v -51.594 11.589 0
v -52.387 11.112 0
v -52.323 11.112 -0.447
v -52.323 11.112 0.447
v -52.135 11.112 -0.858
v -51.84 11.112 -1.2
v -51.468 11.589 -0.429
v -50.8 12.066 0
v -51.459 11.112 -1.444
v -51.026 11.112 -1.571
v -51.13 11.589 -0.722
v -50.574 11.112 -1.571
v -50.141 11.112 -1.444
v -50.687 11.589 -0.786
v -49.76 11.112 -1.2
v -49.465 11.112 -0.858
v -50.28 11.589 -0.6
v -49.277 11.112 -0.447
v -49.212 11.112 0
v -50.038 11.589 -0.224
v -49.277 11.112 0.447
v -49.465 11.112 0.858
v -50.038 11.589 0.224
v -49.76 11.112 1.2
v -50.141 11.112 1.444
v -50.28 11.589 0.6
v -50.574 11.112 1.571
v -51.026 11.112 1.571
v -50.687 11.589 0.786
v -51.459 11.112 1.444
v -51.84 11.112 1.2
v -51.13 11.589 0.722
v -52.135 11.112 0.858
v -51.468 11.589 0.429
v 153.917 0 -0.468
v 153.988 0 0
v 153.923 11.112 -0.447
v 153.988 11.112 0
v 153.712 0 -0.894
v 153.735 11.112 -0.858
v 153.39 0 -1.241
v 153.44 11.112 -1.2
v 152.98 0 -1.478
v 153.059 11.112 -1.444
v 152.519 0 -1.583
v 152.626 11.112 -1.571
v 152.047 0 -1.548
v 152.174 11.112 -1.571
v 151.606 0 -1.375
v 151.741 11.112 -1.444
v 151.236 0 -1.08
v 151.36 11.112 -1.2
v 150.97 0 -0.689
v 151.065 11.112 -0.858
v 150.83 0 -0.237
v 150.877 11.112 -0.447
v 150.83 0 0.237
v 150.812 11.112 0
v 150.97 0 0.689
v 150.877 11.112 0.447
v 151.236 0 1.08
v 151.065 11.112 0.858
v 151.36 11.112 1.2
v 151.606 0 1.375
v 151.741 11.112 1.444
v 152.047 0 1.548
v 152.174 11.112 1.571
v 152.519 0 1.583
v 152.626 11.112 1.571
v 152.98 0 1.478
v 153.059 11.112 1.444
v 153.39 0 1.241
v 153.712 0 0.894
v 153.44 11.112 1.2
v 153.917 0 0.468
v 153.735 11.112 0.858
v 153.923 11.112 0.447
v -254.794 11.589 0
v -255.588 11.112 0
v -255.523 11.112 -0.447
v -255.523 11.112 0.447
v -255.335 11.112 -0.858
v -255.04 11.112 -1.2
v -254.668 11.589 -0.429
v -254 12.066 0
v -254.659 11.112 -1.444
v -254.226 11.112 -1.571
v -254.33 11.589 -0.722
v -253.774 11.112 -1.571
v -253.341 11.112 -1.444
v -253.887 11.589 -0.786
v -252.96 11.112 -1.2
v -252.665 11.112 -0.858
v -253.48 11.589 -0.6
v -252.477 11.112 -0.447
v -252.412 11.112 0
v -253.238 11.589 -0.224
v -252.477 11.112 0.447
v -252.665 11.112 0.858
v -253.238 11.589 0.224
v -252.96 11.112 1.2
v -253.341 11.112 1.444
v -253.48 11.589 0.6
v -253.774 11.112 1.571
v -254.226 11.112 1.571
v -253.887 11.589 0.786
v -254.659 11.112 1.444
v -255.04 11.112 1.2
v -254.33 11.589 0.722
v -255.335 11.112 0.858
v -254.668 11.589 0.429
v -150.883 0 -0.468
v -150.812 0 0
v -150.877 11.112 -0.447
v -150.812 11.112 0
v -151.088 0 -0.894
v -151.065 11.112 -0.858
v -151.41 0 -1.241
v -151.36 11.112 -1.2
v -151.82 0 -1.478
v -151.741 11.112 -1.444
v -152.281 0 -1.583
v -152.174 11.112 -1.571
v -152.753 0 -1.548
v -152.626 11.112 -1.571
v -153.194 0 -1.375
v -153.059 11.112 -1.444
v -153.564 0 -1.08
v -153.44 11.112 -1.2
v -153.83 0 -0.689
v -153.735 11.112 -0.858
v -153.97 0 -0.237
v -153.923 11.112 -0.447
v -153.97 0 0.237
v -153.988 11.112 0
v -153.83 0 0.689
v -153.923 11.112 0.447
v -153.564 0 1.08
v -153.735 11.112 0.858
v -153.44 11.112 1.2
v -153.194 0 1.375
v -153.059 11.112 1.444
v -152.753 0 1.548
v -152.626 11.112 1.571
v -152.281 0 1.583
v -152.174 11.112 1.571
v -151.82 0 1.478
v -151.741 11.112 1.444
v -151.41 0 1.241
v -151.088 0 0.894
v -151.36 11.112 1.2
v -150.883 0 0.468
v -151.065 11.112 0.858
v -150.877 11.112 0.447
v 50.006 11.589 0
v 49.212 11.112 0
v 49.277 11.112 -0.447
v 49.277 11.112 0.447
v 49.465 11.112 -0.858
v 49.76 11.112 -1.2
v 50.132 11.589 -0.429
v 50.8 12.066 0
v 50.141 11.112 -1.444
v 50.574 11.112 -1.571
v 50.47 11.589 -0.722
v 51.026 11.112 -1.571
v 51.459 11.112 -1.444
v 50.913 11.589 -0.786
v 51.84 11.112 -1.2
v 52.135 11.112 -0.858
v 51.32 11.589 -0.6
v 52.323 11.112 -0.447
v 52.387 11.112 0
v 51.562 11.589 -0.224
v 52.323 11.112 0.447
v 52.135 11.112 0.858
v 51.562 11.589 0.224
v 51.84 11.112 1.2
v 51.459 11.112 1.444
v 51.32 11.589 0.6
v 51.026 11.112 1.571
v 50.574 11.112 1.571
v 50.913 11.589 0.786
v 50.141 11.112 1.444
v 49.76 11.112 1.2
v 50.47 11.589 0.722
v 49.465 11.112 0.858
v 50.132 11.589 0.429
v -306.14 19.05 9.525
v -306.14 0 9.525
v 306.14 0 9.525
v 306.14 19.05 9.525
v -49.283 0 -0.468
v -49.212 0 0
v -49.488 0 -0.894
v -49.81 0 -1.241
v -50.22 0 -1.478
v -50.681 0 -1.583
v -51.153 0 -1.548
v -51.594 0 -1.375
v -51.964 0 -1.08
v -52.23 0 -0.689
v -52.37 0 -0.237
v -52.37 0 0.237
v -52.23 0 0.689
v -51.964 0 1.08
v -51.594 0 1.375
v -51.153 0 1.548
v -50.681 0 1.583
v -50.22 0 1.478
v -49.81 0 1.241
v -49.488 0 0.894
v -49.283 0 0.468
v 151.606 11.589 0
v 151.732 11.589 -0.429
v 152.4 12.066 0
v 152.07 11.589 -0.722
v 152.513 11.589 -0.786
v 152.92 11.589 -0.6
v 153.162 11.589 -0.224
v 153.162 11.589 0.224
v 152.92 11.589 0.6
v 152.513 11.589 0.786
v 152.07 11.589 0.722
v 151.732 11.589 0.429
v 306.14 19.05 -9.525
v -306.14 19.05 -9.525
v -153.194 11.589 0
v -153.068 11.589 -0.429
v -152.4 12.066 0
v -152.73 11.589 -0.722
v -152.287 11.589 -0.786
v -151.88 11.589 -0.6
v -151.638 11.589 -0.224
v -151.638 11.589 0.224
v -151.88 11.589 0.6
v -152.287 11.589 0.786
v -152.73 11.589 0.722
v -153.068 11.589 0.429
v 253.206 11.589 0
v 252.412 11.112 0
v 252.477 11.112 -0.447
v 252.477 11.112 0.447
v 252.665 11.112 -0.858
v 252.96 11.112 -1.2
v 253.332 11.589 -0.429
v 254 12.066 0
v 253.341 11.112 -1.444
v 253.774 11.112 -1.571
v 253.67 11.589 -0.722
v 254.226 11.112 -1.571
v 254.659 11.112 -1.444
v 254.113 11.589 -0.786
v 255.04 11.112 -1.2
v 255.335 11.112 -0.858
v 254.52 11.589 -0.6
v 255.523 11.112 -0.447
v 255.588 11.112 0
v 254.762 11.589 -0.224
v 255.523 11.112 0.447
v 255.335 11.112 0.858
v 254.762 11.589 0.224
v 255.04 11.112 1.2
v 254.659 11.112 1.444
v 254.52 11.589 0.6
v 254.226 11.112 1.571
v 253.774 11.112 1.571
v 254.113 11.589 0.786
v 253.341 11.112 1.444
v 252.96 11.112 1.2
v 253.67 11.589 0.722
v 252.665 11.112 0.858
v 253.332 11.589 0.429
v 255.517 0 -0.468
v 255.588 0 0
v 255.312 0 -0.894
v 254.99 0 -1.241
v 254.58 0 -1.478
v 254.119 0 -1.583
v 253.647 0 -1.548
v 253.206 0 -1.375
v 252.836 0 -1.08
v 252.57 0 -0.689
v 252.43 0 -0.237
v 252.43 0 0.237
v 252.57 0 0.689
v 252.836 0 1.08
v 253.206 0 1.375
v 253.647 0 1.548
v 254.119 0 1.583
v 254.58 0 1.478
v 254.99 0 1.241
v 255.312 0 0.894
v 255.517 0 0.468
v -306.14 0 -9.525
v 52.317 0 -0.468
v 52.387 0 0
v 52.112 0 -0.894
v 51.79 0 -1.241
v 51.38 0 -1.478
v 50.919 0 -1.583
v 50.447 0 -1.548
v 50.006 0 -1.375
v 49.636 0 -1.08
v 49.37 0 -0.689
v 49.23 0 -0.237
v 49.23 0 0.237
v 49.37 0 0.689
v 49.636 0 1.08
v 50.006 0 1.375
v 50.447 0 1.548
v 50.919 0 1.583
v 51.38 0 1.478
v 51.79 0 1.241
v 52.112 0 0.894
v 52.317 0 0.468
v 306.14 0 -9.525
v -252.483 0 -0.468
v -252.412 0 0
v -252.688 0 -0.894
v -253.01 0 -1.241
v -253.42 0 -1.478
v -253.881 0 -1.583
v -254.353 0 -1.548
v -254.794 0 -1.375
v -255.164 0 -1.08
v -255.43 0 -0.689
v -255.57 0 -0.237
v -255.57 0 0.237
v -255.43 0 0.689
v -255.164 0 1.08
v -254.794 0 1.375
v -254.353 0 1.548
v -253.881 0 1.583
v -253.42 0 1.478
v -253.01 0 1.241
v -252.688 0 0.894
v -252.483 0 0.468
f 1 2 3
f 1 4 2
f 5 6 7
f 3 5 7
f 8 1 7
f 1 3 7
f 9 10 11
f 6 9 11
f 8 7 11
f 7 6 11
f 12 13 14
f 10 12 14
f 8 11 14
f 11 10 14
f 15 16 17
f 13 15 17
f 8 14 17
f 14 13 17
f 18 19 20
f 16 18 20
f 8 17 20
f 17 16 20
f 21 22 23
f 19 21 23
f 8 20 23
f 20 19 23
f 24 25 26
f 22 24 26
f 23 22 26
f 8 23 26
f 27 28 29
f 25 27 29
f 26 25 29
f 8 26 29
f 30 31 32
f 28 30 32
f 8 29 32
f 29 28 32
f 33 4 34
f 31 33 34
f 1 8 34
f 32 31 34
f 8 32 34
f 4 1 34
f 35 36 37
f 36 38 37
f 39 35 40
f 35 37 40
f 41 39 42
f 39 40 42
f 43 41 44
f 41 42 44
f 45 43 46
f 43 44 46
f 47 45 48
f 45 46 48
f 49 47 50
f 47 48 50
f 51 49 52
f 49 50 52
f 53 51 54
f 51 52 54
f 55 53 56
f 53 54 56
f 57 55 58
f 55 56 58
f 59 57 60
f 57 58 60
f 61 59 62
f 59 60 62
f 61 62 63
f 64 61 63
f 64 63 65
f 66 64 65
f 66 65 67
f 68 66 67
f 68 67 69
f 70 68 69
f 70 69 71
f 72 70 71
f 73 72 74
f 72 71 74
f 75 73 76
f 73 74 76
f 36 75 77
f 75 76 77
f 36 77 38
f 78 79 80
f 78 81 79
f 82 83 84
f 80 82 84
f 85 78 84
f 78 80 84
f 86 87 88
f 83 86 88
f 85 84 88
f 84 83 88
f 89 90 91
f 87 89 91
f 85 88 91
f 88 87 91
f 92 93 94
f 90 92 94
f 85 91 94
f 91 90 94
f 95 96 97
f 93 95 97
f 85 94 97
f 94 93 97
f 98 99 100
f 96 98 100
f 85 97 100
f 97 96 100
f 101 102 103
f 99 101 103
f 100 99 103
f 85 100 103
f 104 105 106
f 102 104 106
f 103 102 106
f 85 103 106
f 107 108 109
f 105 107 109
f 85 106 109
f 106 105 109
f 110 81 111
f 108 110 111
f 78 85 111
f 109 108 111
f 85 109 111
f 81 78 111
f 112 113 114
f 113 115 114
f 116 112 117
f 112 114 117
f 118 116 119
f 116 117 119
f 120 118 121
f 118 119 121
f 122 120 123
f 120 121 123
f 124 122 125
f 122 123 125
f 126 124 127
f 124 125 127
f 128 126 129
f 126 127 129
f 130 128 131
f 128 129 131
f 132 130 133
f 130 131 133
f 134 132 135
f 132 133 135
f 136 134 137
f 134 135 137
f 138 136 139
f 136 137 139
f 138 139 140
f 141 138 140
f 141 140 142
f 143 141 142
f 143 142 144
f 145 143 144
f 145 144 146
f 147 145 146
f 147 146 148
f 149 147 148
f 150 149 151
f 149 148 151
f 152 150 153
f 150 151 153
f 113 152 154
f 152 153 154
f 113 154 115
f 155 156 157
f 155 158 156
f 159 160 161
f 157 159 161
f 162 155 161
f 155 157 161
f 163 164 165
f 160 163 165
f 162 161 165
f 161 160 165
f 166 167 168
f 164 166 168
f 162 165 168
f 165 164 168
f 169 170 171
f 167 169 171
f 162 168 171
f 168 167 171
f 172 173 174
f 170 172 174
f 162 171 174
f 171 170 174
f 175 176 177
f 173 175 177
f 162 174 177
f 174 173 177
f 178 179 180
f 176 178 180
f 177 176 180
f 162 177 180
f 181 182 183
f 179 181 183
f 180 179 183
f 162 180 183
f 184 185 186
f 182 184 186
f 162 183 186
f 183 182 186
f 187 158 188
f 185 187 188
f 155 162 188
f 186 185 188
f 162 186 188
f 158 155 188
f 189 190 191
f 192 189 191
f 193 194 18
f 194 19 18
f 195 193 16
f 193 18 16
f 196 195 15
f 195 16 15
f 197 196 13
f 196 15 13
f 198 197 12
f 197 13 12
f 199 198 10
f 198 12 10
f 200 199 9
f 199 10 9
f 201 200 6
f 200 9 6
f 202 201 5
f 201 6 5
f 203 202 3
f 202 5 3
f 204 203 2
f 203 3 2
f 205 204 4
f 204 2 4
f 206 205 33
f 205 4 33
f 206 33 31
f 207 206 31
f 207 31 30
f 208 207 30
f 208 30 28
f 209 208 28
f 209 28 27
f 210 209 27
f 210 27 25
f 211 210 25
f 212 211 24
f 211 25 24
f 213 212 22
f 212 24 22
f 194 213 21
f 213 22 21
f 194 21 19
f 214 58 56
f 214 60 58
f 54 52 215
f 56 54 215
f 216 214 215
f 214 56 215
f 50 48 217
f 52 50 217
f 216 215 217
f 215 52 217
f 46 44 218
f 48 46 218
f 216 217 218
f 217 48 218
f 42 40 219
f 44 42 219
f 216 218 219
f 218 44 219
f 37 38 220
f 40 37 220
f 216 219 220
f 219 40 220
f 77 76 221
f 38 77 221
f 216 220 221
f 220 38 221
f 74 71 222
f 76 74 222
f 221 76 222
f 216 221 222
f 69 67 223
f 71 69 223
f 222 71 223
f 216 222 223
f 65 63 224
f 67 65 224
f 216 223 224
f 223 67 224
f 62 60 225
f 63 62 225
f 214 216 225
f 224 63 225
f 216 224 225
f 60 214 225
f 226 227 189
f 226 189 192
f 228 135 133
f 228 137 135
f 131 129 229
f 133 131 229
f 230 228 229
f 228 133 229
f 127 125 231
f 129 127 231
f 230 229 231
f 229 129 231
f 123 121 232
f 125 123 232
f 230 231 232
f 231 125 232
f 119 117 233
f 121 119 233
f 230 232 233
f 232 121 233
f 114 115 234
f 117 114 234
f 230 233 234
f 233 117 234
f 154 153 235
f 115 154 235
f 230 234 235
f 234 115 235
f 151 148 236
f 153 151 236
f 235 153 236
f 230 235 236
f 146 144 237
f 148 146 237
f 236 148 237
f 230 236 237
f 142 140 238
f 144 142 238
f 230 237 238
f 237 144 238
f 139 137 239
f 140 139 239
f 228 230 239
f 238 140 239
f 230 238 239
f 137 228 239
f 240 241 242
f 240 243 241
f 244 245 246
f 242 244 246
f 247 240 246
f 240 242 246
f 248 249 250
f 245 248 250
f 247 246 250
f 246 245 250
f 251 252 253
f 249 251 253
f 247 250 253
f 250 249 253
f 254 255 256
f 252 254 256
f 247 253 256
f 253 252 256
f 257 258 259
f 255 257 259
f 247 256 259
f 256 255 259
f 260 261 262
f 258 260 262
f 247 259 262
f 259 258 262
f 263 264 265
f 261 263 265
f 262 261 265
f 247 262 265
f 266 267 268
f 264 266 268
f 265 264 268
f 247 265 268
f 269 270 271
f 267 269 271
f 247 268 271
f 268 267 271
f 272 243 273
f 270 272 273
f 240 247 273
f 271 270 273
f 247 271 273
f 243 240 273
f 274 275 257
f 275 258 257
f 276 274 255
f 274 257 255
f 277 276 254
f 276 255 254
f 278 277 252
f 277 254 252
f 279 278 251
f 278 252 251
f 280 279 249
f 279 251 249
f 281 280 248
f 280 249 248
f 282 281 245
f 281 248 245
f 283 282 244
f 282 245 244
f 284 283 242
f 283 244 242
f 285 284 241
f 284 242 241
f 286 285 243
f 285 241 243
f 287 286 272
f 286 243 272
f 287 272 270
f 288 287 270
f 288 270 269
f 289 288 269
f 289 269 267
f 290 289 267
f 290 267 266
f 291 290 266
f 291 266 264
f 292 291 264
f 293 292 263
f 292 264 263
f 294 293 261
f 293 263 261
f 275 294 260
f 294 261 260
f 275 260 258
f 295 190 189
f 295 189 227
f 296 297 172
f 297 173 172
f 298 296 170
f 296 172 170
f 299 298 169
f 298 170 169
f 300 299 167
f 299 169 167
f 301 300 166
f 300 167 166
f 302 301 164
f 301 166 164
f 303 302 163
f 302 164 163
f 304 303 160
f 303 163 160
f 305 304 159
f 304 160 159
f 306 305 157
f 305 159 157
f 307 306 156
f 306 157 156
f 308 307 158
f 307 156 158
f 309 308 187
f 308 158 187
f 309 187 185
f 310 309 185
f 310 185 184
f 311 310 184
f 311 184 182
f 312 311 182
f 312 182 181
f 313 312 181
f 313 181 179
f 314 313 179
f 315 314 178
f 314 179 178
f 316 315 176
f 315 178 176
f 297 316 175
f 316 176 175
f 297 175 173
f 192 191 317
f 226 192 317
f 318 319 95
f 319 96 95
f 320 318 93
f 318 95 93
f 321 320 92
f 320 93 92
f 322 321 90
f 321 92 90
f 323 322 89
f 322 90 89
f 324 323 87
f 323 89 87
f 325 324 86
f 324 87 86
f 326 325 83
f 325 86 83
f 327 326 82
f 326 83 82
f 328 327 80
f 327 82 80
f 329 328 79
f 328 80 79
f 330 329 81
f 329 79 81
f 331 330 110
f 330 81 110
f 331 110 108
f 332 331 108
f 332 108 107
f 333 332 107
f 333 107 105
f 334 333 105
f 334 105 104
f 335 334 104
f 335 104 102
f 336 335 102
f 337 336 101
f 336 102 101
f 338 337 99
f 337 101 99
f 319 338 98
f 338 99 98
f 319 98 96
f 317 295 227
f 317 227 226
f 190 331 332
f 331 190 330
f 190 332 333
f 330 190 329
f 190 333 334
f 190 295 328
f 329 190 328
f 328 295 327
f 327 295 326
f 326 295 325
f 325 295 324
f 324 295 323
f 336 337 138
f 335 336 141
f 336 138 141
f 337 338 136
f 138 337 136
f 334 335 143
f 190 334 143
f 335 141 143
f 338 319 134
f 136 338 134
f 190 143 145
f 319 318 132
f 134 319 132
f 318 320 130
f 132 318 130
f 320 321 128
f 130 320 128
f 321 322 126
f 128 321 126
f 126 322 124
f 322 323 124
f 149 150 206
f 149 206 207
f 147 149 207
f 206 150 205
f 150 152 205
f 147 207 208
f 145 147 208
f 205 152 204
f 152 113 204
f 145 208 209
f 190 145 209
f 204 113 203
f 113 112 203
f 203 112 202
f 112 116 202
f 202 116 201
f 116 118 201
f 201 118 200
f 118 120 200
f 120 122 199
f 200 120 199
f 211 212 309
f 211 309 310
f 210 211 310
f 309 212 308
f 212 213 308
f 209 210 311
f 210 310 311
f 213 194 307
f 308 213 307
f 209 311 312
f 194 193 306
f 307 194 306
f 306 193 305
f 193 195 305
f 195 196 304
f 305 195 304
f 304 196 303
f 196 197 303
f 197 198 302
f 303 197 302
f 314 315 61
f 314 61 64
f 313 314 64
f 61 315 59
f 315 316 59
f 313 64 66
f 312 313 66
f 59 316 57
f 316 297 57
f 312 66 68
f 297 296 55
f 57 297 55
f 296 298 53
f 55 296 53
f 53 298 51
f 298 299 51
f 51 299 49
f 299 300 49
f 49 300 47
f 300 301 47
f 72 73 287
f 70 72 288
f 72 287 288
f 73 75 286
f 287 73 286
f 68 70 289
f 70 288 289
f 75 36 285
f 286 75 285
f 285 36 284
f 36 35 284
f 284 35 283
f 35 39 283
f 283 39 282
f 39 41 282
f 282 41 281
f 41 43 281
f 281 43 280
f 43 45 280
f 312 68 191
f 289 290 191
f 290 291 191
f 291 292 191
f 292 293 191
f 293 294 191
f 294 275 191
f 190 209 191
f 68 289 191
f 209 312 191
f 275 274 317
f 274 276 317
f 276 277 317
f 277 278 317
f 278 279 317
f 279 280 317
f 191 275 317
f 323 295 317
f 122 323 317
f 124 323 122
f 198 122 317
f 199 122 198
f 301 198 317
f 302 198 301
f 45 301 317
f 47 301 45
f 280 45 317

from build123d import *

# Parameters (mm, degrees)
SKETCH1_W                        = 612.2797
SKETCH1_H                        = 19.05
BOSS_EXTRUDE1_DEPTH              = 19.05
F_1_8_0_125_DIAMETER_HOLE1_D     = 3.175
F_1_8_0_125_DIAMETER_HOLE1_DEPTH = 11.1125
F_1_8_0_125_DIAMETER_HOLE1_TIP   = 0.953866233


with BuildPart() as part:
    # Sketch1 → Boss-Extrude1 (new body)
    with BuildSketch(Plane(origin=(0, 0, 0), x_dir=(1, 0, 0), z_dir=(0, 1, 0))):
        Rectangle(SKETCH1_W, SKETCH1_H)
    extrude(amount=BOSS_EXTRUDE1_DEPTH)

    # 1/8 (0.125) Diameter Hole1
    with Locations(Plane(origin=(0, 0, 0), x_dir=(-1, 0, 0), z_dir=(0, -1, 0))):
        with Locations((254, 0), (152.4, 0), (50.8, 0), (-50.8, 0), (-152.4, 0), (-254, 0)):
            Hole(F_1_8_0_125_DIAMETER_HOLE1_D / 2, depth=F_1_8_0_125_DIAMETER_HOLE1_DEPTH)
            with Locations((0, 0, -(F_1_8_0_125_DIAMETER_HOLE1_DEPTH + F_1_8_0_125_DIAMETER_HOLE1_TIP / 2))):  # 118° drill point
                Cone(0, F_1_8_0_125_DIAMETER_HOLE1_D / 2, F_1_8_0_125_DIAMETER_HOLE1_TIP, mode=Mode.SUBTRACT)


solid = part.part
